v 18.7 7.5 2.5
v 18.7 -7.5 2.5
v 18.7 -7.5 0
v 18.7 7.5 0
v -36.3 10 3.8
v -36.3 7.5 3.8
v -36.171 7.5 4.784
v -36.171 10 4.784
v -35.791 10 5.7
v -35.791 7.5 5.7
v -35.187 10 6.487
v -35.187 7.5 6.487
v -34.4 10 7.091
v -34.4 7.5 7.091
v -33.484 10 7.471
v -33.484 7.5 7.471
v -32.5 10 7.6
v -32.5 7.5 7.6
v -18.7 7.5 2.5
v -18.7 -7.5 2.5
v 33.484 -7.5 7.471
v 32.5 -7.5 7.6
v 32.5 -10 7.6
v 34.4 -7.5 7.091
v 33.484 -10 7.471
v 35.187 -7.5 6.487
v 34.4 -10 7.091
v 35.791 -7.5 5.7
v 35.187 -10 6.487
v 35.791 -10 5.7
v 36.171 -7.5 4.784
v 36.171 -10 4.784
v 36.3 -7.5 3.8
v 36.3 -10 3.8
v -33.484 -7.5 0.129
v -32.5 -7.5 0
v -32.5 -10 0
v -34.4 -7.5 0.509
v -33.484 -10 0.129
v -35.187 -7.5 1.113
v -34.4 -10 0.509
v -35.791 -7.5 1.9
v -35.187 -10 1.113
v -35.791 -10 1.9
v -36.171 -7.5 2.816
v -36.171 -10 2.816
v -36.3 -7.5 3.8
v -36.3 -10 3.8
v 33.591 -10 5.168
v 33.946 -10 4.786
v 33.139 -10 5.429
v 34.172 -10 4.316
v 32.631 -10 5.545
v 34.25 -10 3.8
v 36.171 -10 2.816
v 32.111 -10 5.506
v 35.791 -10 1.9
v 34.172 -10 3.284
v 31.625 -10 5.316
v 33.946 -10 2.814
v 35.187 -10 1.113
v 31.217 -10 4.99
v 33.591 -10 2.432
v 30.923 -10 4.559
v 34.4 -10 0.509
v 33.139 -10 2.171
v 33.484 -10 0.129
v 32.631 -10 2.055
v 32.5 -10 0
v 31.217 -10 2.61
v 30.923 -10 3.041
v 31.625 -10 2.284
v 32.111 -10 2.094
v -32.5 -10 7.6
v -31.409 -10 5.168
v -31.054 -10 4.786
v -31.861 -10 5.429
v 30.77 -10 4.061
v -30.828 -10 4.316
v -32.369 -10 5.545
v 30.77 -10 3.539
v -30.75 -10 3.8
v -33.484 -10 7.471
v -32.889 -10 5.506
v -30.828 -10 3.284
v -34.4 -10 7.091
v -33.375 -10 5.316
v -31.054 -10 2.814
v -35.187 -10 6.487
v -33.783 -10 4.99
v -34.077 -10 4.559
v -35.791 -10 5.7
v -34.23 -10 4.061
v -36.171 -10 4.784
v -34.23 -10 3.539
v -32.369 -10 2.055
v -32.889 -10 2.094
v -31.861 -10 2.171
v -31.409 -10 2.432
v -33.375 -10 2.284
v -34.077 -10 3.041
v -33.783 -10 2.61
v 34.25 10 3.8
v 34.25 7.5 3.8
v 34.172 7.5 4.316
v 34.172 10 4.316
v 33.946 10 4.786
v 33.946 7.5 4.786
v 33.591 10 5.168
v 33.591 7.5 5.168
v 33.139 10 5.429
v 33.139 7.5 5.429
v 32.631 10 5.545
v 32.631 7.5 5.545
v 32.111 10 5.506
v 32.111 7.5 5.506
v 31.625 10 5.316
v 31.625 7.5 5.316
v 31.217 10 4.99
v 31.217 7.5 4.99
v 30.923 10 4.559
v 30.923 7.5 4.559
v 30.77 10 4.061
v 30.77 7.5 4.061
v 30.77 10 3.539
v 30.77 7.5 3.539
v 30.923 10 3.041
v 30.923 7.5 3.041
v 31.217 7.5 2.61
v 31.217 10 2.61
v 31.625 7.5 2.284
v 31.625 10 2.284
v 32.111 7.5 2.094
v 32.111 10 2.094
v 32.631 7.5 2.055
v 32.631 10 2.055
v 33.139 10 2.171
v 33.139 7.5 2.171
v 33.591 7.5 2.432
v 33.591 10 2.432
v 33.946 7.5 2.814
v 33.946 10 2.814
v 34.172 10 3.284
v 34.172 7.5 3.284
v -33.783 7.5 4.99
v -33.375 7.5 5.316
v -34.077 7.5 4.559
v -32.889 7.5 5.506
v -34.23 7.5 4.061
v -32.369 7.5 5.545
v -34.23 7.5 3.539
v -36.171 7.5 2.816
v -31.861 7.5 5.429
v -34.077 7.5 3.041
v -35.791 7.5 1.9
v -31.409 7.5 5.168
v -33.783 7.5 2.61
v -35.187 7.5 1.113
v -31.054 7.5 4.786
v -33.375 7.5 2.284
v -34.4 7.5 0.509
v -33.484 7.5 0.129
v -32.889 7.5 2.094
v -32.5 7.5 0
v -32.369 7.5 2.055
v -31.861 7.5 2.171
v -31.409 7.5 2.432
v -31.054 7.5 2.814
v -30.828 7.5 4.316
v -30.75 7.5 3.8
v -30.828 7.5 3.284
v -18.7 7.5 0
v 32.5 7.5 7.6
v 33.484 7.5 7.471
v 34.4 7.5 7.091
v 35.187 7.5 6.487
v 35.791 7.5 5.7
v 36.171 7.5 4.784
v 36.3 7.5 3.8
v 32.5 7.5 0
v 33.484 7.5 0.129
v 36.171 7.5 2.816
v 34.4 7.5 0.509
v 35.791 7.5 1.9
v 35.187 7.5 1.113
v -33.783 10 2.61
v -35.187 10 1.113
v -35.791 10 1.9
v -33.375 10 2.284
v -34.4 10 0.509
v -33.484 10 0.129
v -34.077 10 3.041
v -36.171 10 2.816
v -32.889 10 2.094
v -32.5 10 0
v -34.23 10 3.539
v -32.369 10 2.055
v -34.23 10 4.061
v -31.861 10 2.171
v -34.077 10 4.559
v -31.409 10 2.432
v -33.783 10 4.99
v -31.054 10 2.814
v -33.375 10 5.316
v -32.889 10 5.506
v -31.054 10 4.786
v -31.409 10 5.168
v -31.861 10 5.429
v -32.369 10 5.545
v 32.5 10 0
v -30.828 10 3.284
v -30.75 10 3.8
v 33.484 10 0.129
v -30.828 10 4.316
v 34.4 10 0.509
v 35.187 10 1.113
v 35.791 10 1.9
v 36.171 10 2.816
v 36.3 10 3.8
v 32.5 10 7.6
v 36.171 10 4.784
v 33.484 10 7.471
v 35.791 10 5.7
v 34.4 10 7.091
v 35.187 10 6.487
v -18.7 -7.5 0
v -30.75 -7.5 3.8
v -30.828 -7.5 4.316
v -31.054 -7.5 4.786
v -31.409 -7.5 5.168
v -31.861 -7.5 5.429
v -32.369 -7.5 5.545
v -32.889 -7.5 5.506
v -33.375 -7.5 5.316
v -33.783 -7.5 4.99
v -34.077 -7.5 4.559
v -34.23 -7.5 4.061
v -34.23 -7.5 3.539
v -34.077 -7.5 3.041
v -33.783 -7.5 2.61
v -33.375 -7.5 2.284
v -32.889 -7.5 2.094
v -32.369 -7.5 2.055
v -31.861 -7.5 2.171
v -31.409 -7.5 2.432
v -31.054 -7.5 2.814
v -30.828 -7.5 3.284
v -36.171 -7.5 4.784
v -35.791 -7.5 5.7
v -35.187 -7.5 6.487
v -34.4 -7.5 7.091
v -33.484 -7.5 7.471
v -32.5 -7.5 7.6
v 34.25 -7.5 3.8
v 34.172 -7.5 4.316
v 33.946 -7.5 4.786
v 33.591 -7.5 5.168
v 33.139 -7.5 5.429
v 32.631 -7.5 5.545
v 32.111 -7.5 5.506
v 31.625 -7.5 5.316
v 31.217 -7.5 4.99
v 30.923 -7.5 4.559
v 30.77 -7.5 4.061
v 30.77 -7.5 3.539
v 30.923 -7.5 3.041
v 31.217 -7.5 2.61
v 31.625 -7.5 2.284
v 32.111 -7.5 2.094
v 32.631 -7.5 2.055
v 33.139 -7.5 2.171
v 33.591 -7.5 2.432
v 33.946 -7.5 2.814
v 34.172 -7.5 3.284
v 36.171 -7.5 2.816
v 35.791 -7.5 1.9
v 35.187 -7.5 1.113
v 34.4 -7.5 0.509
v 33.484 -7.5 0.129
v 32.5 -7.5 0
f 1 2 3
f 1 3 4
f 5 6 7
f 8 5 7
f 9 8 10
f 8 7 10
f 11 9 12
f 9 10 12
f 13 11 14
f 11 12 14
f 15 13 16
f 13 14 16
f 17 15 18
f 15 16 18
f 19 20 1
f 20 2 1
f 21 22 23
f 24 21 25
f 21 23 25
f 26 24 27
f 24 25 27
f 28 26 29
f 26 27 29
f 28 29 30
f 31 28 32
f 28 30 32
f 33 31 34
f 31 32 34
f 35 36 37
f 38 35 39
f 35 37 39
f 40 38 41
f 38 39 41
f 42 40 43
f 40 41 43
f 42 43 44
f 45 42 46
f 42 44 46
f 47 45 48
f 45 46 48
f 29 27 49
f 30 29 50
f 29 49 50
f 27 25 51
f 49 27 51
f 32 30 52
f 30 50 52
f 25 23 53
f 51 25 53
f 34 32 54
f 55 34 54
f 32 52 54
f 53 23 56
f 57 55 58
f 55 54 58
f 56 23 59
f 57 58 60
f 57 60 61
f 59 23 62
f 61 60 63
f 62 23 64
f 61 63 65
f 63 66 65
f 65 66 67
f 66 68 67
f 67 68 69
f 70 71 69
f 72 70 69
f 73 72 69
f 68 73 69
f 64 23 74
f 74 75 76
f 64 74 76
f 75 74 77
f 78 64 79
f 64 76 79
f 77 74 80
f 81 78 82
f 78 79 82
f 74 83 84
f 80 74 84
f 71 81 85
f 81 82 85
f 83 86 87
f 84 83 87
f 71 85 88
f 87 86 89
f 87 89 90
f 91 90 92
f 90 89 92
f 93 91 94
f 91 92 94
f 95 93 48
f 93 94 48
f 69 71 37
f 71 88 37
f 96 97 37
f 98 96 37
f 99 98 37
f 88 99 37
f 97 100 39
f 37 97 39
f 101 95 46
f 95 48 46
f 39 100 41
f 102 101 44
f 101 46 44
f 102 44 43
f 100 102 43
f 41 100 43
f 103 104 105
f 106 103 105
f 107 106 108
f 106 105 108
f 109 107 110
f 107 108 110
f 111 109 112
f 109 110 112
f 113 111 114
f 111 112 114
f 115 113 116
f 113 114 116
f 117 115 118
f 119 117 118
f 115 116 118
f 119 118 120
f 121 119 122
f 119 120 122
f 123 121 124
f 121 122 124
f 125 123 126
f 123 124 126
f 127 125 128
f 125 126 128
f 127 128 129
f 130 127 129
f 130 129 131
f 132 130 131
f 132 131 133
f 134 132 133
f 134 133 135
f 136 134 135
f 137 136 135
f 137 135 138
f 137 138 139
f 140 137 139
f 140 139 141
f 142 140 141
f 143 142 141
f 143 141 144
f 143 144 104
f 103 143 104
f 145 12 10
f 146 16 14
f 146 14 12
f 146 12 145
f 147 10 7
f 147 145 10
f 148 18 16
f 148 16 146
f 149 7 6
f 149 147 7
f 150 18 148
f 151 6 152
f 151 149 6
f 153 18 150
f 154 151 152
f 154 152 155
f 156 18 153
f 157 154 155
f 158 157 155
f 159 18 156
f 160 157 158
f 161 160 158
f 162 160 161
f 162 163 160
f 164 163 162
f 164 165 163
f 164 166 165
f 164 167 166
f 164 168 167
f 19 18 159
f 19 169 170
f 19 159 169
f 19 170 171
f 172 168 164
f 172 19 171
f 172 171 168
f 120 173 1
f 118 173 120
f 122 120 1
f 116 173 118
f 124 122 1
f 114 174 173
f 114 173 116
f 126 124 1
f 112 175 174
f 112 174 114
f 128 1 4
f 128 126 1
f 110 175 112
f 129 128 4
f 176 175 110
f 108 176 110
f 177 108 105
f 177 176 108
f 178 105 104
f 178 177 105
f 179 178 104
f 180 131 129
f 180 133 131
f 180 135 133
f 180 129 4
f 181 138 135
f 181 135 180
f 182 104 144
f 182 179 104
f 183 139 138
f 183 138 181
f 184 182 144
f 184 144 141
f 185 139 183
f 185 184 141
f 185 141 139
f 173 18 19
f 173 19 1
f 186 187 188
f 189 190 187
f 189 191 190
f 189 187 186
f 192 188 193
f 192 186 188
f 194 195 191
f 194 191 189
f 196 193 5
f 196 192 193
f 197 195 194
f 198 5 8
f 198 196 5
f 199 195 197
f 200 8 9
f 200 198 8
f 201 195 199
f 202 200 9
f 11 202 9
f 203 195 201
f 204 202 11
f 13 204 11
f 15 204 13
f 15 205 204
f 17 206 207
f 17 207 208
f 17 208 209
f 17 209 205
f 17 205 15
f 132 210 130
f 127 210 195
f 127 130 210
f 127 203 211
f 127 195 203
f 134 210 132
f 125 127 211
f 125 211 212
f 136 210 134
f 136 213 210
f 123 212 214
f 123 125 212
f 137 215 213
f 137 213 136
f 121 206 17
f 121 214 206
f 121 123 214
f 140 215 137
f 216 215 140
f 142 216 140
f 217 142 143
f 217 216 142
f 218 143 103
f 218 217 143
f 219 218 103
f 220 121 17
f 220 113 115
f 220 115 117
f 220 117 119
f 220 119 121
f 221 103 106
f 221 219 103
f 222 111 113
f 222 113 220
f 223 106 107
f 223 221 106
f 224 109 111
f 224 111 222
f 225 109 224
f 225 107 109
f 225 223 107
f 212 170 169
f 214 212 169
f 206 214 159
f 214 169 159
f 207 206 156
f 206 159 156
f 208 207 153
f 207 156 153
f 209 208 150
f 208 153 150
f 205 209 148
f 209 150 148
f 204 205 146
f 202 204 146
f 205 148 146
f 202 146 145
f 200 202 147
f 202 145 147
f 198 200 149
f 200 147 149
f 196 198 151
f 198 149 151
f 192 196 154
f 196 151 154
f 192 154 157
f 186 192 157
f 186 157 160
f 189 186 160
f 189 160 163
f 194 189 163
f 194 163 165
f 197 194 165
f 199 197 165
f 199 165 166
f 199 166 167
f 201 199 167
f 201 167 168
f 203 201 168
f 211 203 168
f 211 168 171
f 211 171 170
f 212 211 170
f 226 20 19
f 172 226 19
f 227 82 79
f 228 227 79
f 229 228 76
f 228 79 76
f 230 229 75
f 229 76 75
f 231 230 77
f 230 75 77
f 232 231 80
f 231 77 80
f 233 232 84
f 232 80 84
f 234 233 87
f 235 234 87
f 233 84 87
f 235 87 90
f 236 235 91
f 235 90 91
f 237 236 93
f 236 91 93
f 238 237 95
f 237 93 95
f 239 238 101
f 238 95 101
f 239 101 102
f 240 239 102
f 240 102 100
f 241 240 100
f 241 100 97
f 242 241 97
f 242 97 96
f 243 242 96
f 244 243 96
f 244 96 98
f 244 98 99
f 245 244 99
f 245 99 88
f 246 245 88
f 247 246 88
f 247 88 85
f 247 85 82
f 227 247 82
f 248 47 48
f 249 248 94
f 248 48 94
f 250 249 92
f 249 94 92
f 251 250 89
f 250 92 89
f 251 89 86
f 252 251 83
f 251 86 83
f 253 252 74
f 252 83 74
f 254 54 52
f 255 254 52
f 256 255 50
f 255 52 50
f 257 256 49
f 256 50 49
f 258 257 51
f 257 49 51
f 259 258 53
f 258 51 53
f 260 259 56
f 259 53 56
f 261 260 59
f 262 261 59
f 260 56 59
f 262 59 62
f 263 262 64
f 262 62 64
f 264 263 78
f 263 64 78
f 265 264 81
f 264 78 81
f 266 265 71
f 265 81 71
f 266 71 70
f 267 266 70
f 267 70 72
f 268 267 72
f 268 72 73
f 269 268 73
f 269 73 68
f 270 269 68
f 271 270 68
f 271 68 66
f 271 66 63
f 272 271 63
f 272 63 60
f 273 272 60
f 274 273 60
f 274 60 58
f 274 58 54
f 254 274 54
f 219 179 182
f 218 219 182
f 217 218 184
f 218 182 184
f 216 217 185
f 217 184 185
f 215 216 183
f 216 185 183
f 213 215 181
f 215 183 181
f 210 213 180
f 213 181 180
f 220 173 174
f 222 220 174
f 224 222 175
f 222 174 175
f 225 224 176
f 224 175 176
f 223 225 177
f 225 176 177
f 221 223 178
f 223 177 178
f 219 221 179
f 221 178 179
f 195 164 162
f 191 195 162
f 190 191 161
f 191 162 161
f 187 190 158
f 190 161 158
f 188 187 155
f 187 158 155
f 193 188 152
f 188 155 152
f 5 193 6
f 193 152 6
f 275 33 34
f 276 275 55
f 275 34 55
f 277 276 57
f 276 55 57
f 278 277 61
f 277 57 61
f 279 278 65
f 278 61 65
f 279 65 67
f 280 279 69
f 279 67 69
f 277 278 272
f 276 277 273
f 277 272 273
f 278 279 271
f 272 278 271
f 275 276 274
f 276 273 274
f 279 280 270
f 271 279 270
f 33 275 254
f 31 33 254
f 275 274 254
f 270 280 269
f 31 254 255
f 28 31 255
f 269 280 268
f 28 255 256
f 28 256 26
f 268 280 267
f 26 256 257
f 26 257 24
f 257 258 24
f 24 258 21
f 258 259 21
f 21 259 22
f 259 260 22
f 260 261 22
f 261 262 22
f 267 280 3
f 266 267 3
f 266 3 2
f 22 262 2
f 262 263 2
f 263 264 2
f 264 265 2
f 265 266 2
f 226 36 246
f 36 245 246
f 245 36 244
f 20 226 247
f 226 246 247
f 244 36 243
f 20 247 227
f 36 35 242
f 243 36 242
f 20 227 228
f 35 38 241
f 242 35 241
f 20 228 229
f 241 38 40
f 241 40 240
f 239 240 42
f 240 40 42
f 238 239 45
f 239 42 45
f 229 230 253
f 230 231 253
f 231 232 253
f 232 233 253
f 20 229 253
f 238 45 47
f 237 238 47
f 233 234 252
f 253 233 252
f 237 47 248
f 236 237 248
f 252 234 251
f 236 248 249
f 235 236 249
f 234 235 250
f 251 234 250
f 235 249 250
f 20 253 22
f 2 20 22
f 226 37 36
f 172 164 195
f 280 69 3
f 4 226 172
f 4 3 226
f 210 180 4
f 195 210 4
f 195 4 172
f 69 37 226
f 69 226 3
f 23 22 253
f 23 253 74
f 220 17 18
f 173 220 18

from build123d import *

# Parameters (mm, degrees)
F0_W     = 15
F0_H     = 2.5
F1_DEPTH = 18.7
F2_DEPTH = 36.3
F3_R     = 1.75
F4_DEPTH = 20.001


with BuildPart() as f1:
    # F0 (on Right) → F1 (new body, symmetric)
    with BuildSketch(Plane.YZ):
        with Locations((0, 1.25)):
            Rectangle(F0_W, F0_H)
    extrude(amount=F1_DEPTH, both=True)

    # F0 (on Right) → F2 (join, symmetric)
    with BuildSketch(Plane.YZ):
        Polygon((-10, 0), (-7.5, 0), (-7.5, 2.5), (-7.5, 7.6), (-10, 7.6), align=None)
        Polygon((7.5, 2.5), (7.5, 0), (10, 0), (10, 7.6), (7.5, 7.6), align=None)
    extrude(amount=F2_DEPTH, both=True)

    # F3 (on face) → F4 (cut, through all)
    with BuildSketch(Plane.XZ.offset(10)):
        with Locations((-32.5, 3.8)):
            Circle(F3_R)
        with Locations((32.5, 3.8)):
            Circle(F3_R)
        Polygon((-36.3, 0), (-36.3, 3.8), (-36.3, 7.6), (-40.478576, 7.6), (-40.478576, 0), align=None)
        with BuildLine():
            Line((-36.3, 0), (-32.5, 0))
            ThreePointArc((-32.5, 0), (-35.187006, 1.112994), (-36.3, 3.8))
            Line((-36.3, 3.8), (-36.3, 0))
        make_face()
        with BuildLine():
            ThreePointArc((-36.3, 3.8), (-35.187006, 6.487006), (-32.5, 7.6))
            Line((-32.5, 7.6), (-36.3, 7.6))
            Line((-36.3, 7.6), (-36.3, 3.8))
        make_face()
        with BuildLine():
            Line((36.3, 7.6), (32.5, 7.6))
            ThreePointArc((32.5, 7.6), (35.187006, 6.487006), (36.3, 3.8))
            Line((36.3, 3.8), (36.3, 7.6))
        make_face()
        with BuildLine():
            ThreePointArc((36.3, 3.8), (35.187006, 1.112994), (32.5, 0))
            Line((32.5, 0), (36.3, 0))
            Line((36.3, 0), (36.3, 3.8))
        make_face()
        Polygon((40.478576, 7.6), (36.3, 7.6), (36.3, 3.8), (36.3, 0), (40.478576, 0), align=None)
    extrude(amount=-F4_DEPTH, mode=Mode.SUBTRACT)


solid = f1.part
